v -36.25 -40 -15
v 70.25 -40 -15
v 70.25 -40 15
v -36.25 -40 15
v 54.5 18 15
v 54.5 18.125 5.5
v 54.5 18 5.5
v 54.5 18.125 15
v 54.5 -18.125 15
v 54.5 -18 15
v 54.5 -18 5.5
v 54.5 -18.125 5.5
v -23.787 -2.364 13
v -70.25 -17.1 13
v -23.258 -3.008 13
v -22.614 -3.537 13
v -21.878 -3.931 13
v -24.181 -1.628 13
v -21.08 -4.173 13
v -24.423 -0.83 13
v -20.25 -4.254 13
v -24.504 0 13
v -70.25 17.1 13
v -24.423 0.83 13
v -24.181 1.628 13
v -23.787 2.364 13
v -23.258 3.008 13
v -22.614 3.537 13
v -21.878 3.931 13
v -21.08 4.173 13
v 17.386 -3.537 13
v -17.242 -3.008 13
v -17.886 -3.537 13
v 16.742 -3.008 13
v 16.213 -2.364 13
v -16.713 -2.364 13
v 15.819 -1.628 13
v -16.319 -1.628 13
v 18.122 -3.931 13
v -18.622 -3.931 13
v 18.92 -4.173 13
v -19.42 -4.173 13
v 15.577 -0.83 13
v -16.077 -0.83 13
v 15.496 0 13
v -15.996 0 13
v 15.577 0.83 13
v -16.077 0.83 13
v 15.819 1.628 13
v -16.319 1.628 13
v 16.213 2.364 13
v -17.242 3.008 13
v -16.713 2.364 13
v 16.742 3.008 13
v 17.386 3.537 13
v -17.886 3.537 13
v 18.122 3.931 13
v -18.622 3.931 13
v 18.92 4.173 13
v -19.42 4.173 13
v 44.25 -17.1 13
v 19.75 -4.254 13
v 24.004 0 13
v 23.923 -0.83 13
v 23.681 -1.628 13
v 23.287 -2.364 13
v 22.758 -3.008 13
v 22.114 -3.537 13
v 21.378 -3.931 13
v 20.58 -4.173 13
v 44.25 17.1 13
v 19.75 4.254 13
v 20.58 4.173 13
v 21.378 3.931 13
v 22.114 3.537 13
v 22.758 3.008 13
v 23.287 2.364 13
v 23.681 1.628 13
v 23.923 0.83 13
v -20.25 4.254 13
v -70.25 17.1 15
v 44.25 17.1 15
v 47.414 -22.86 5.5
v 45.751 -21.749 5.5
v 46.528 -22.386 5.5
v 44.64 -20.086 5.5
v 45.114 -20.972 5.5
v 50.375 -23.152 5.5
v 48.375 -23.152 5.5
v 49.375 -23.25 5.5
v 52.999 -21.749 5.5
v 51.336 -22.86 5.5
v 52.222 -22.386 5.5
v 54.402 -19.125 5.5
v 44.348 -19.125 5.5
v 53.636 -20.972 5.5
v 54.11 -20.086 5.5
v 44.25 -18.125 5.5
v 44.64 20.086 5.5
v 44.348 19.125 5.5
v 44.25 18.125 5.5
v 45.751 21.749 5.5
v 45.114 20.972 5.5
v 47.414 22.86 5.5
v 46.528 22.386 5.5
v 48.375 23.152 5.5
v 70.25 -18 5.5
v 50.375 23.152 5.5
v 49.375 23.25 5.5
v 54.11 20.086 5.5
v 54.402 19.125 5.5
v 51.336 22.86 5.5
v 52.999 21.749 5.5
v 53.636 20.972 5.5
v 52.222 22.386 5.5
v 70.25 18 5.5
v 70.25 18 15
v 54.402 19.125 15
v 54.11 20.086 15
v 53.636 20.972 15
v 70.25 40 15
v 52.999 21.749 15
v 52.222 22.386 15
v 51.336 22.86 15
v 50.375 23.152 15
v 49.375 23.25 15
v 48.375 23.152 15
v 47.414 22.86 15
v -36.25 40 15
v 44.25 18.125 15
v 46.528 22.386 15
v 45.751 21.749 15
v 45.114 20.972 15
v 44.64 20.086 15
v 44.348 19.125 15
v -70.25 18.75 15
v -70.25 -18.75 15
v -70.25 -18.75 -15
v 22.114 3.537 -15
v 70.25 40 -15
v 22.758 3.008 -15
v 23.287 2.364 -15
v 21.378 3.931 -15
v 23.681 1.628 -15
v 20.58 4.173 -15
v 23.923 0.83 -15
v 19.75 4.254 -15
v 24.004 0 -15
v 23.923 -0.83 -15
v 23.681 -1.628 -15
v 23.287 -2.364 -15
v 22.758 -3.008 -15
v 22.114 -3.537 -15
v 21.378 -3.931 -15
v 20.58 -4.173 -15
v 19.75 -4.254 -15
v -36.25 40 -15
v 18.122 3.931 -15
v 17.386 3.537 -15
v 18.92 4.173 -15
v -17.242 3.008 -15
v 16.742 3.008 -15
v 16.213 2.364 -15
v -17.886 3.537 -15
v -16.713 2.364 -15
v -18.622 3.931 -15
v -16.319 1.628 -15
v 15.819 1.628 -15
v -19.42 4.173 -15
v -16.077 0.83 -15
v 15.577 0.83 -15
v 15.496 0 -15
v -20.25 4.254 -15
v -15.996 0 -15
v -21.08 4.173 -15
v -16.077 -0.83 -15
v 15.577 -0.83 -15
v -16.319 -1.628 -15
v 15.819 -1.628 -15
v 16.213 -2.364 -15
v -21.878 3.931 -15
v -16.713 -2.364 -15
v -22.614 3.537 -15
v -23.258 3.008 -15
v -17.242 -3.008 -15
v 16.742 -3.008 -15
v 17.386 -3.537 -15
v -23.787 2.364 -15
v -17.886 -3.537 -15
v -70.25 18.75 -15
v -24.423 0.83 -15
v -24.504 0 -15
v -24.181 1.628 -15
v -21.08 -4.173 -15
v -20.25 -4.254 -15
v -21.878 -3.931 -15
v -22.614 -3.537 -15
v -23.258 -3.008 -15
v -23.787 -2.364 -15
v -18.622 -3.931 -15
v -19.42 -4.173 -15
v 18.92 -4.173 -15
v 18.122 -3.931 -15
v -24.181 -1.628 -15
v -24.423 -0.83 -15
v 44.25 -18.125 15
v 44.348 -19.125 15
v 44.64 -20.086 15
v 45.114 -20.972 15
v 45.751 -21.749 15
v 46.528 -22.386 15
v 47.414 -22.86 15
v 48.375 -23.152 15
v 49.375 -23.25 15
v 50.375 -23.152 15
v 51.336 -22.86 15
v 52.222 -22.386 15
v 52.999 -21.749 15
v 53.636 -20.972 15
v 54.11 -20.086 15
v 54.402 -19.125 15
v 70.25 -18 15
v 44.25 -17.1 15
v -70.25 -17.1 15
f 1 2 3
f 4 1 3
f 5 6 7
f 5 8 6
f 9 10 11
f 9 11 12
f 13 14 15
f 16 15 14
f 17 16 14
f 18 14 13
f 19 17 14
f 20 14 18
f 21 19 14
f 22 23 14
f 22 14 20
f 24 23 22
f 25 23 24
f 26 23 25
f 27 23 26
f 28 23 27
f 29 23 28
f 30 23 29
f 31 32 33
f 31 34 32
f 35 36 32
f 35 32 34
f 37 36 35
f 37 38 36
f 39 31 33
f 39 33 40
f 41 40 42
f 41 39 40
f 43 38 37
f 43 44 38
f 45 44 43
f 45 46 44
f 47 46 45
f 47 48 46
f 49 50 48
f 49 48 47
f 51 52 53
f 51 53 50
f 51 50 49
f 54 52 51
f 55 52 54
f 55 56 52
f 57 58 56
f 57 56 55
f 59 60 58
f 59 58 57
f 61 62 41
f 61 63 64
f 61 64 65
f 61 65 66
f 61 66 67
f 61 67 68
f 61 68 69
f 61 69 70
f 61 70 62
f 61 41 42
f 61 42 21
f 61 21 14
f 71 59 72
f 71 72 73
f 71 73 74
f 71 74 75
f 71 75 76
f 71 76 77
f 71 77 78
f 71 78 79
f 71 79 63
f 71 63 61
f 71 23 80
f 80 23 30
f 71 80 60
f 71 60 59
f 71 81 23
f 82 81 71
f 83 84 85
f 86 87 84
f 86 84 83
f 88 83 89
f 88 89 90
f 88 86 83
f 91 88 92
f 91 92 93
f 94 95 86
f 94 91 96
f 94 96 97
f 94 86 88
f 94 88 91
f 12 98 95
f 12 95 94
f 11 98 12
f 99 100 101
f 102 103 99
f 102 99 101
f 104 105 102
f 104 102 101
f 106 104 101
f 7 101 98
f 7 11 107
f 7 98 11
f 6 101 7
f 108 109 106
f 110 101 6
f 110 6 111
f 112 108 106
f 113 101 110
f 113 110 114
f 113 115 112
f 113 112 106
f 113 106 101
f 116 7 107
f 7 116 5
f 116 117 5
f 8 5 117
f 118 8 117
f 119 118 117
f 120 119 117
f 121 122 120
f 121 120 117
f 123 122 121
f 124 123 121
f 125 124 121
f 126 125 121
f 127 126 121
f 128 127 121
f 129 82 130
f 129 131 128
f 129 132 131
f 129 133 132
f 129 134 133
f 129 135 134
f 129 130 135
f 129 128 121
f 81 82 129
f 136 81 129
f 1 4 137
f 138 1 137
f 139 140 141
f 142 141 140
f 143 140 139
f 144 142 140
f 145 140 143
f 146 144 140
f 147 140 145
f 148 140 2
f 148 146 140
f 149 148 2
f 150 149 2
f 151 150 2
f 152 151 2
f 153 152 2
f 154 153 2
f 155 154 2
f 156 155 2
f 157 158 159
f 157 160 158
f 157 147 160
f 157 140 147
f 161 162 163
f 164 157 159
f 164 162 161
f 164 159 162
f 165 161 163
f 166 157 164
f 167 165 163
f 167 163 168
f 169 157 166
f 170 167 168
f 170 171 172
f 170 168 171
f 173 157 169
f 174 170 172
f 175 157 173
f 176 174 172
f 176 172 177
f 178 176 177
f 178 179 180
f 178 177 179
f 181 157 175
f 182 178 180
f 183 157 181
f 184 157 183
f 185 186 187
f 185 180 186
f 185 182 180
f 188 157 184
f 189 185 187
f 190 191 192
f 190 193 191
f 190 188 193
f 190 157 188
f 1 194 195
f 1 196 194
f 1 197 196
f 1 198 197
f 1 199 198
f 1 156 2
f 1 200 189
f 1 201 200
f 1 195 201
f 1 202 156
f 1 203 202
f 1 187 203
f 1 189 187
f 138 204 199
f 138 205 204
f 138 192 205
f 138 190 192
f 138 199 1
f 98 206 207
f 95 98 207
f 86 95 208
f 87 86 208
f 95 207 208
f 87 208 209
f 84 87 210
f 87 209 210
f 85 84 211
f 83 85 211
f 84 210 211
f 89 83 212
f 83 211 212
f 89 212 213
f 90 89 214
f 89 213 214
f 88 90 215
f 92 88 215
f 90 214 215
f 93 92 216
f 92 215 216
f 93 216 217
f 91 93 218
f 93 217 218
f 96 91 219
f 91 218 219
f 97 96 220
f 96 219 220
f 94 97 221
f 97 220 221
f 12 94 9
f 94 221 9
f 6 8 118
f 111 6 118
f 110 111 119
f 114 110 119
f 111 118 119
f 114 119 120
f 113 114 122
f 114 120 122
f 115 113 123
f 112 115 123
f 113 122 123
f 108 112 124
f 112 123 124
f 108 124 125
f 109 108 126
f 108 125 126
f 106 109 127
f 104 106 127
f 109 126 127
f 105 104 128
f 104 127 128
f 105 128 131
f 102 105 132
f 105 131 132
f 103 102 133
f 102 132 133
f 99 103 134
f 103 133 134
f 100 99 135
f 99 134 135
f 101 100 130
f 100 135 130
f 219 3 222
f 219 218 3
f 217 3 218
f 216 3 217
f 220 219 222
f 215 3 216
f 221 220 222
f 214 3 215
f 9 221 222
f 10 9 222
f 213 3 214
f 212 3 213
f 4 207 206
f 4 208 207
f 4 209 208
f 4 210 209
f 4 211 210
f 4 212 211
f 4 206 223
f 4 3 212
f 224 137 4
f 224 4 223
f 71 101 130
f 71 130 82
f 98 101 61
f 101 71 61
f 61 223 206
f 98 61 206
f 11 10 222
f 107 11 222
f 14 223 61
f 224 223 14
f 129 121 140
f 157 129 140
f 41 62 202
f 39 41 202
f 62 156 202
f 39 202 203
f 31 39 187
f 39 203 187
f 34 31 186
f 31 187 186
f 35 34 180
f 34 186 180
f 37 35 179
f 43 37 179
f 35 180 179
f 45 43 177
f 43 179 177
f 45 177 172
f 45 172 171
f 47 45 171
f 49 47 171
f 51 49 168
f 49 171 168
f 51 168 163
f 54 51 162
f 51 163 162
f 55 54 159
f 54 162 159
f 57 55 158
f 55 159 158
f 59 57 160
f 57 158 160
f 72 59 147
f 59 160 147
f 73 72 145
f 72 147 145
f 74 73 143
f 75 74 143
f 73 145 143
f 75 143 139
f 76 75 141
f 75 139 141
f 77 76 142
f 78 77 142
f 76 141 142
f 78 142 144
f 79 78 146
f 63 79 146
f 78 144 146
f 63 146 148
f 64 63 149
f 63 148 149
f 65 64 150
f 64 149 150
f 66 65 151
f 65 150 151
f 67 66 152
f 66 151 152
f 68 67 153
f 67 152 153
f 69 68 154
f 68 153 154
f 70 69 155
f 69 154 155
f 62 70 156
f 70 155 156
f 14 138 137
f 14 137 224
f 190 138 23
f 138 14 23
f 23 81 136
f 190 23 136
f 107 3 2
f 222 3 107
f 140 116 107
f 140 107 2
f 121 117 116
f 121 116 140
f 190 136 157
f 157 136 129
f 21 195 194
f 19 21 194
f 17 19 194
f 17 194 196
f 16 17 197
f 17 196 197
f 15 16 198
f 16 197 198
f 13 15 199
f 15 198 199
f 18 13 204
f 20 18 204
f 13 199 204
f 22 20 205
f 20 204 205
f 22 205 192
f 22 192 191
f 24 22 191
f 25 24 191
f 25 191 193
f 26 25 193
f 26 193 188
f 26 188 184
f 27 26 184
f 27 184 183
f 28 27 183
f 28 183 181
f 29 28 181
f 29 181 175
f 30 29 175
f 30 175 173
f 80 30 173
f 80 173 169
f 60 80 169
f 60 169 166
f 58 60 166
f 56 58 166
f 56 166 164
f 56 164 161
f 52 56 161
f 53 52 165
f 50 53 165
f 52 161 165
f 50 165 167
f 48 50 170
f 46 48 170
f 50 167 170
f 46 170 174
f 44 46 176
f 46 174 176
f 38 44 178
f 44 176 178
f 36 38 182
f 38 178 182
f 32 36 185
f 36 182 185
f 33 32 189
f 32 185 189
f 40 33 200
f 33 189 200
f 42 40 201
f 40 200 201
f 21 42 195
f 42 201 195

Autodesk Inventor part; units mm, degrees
ref_plane "Right" through (0, 0, 0) normal (1, 0, 0) x (0, 1, 0)
ref_plane "Top" through (0, 0, 0) normal (0, 1, 0) x (-1, 0, 0)
ref_plane "Front" through (0, 0, 0) normal (0, 0, 1) x (1, 0, 0)
sketch "Sketch1" plane through (0, 0, 0) normal (1, 0, 0) x (0, 1, 0)
  line L0 (-40, 15) -> (40, 15)
  line L1 (40, 15) -> (40, -15)
  line L2 (40, -15) -> (-40, -15)
  line L3 (-40, -15) -> (-40, 15)
  line L4 (-40, 15) -> (40, -15) construction
  line L5 (40, 15) -> (-40, -15) construction
  point P0 (0, 0)
  dimension "d0" = 30
  dimension "d1" = 80
extrude "Extrusion1" add sketch "Sketch1" along normal mid plane 140.5
sketch "Sketch2" plane through (-70.25, -40, 15) normal (0, 0, 1) x (1, 0, 0)
  line L0 (140.5, 80) -> (0, 80) construction
  line L1 (0, 0) -> (0, 80) construction
  line L2 (0, 80) -> (0, 58.75)
  line L3 (0, 58.75) -> (34, 80)
  line L4 (34, 80) -> (0, 80)
  line L5 (0, 21.25) -> (0, 0)
  line L6 (0, 0) -> (34, 0)
  line L7 (34, 0) -> (0, 21.25)
  point P0 (70.25, 40)
  dimension "d4" = 37.5
  dimension "d5" = 106.5
  dimension "d6" = 147.995
extrude "Extrusion2" cut sketch "Sketch2" against normal through all
sketch "Sketch3" plane through (70.25, -40, 15) normal (0, 0, 1) x (1, 0, 0)
  line L0 (0, 80) -> (0, 0) construction
  line L1 (-140.5, 21.25) -> (-140.5, 58.75) construction
  line L2 (-140.5, 57.1) -> (0, 57.1)
  line L3 (0, 57.1) -> (0, 22.9)
  line L4 (0, 22.9) -> (-140.5, 22.9)
  line L5 (-140.5, 22.9) -> (-140.5, 57.1)
  point P0 (-70.25, 40)
  point P1 (-140.5, 40)
  dimension "d9" = 34.2
extrude "Extrusion3" cut sketch "Sketch3" against normal blind 2
sketch "Sketch4" plane through (-36.25, 40, 15) normal (0, 0, 1) x (1, 0, 0)
  line L0 (106.5, -57.1) -> (-34, -57.1) construction
  line L1 (-34, -58.75) -> (-34, -57.1) construction
  line L2 (-34, -58.75) -> (0, -80) construction
  line L3 (0, -80) -> (106.5, -80) construction
  line L4 (106.5, -57.1) -> (106.5, -80) construction
  line L5 (-34, -22.9) -> (106.5, -22.9) construction
  line L6 (-34, -57.1) -> (-34, -22.9) construction
  line L7 (106.5, -57.1) -> (-34, -57.1) construction
  line L8 (106.5, -22.9) -> (106.5, -57.1) construction
  line L9 (106.5, -22) -> (80.5, -22)
  line L10 (80.5, -22) -> (80.5, -58)
  line L11 (80.5, -58) -> (106.5, -58)
  line L12 (106.5, -58) -> (106.5, -22)
  line L13 (85.625, -21.875) -> (85.625, -58.125) construction
  line L14 (90.75, -21.875) -> (90.75, -58.125)
  line L15 (80.5, -58.125) -> (80.5, -21.875)
  arc A0 (90.75, -21.875) -> (80.5, -21.875) centre (85.625, -21.875) ccw
  arc A1 (80.5, -58.125) -> (90.75, -58.125) centre (85.625, -58.125) ccw
  point P0 (36.25, -40)
  point P1 (106.5, -40)
  point P2 (85.625, -40)
  point P3 (80.5, -40)
  dimension "d12" = 36
  dimension "d13" = 26
  dimension "d14" = 46.5
  dimension "d15" = 15.75
extrude "Extrusion4" cut sketch "Sketch4" against normal blind 9.5
sketch "Sketch5" plane through (70.25, -40, 13) normal (0, 0, 1) x (1, 0, 0)
  line L0 (-26, 22.9) -> (-26, 57.1) construction
  line L1 (-15.75, 58) -> (0, 58) construction
  line L2 (-15.75, 58.125) -> (-15.75, 58) construction
  arc A0 (-15.75, 58.125) -> (-26, 58.125) centre (-20.875, 58.125) ccw construction
  line L3 (-26, 21.875) -> (-26, 58.125) construction
  arc A1 (-26, 21.875) -> (-15.75, 21.875) centre (-20.875, 21.875) ccw construction
  line L4 (-15.75, 22) -> (-15.75, 21.875) construction
  line L5 (0, 22) -> (-15.75, 22) construction
  line L6 (0, 58) -> (0, 22) construction
  line L7 (-90.5, 40) -> (-50.5, 40)
  circle A2 centre (-90.5, 40) radius 4.25
  circle A3 centre (-50.5, 40) radius 4.25
  point P0 (-70.25, 40)
  dimension "d18" = 8.5
  dimension "d19" = 48.5
  dimension "d20" = 20.25
  dimension "d23" = 50.5
  dimension "d24" = 40
hole "Hole1" at (-20.25, 0, 13) at (19.75, 0, 13) direction (0, 0, -1) diameter 8.509 end through all
equation "\"BendRadius\" = Thickness"
equation "\"BendReliefWidth\" = 0.5 * Thickness"
equation "\"BendReliefDepth\" = 0.5 * Thickness"
equation "\"CornerReliefSize\" = 4 * Thickness"
equation "\"MinimumRemnant\" = 2 * Thickness"
equation "\"TransitionRadius\" = BendRadius"
equation "\"JacobiRadiusSize\" = BendRadius"
equation "\"Thickness\" = 6.35"
properties part number "DHC-1500-FF-02-002" material "A36"
